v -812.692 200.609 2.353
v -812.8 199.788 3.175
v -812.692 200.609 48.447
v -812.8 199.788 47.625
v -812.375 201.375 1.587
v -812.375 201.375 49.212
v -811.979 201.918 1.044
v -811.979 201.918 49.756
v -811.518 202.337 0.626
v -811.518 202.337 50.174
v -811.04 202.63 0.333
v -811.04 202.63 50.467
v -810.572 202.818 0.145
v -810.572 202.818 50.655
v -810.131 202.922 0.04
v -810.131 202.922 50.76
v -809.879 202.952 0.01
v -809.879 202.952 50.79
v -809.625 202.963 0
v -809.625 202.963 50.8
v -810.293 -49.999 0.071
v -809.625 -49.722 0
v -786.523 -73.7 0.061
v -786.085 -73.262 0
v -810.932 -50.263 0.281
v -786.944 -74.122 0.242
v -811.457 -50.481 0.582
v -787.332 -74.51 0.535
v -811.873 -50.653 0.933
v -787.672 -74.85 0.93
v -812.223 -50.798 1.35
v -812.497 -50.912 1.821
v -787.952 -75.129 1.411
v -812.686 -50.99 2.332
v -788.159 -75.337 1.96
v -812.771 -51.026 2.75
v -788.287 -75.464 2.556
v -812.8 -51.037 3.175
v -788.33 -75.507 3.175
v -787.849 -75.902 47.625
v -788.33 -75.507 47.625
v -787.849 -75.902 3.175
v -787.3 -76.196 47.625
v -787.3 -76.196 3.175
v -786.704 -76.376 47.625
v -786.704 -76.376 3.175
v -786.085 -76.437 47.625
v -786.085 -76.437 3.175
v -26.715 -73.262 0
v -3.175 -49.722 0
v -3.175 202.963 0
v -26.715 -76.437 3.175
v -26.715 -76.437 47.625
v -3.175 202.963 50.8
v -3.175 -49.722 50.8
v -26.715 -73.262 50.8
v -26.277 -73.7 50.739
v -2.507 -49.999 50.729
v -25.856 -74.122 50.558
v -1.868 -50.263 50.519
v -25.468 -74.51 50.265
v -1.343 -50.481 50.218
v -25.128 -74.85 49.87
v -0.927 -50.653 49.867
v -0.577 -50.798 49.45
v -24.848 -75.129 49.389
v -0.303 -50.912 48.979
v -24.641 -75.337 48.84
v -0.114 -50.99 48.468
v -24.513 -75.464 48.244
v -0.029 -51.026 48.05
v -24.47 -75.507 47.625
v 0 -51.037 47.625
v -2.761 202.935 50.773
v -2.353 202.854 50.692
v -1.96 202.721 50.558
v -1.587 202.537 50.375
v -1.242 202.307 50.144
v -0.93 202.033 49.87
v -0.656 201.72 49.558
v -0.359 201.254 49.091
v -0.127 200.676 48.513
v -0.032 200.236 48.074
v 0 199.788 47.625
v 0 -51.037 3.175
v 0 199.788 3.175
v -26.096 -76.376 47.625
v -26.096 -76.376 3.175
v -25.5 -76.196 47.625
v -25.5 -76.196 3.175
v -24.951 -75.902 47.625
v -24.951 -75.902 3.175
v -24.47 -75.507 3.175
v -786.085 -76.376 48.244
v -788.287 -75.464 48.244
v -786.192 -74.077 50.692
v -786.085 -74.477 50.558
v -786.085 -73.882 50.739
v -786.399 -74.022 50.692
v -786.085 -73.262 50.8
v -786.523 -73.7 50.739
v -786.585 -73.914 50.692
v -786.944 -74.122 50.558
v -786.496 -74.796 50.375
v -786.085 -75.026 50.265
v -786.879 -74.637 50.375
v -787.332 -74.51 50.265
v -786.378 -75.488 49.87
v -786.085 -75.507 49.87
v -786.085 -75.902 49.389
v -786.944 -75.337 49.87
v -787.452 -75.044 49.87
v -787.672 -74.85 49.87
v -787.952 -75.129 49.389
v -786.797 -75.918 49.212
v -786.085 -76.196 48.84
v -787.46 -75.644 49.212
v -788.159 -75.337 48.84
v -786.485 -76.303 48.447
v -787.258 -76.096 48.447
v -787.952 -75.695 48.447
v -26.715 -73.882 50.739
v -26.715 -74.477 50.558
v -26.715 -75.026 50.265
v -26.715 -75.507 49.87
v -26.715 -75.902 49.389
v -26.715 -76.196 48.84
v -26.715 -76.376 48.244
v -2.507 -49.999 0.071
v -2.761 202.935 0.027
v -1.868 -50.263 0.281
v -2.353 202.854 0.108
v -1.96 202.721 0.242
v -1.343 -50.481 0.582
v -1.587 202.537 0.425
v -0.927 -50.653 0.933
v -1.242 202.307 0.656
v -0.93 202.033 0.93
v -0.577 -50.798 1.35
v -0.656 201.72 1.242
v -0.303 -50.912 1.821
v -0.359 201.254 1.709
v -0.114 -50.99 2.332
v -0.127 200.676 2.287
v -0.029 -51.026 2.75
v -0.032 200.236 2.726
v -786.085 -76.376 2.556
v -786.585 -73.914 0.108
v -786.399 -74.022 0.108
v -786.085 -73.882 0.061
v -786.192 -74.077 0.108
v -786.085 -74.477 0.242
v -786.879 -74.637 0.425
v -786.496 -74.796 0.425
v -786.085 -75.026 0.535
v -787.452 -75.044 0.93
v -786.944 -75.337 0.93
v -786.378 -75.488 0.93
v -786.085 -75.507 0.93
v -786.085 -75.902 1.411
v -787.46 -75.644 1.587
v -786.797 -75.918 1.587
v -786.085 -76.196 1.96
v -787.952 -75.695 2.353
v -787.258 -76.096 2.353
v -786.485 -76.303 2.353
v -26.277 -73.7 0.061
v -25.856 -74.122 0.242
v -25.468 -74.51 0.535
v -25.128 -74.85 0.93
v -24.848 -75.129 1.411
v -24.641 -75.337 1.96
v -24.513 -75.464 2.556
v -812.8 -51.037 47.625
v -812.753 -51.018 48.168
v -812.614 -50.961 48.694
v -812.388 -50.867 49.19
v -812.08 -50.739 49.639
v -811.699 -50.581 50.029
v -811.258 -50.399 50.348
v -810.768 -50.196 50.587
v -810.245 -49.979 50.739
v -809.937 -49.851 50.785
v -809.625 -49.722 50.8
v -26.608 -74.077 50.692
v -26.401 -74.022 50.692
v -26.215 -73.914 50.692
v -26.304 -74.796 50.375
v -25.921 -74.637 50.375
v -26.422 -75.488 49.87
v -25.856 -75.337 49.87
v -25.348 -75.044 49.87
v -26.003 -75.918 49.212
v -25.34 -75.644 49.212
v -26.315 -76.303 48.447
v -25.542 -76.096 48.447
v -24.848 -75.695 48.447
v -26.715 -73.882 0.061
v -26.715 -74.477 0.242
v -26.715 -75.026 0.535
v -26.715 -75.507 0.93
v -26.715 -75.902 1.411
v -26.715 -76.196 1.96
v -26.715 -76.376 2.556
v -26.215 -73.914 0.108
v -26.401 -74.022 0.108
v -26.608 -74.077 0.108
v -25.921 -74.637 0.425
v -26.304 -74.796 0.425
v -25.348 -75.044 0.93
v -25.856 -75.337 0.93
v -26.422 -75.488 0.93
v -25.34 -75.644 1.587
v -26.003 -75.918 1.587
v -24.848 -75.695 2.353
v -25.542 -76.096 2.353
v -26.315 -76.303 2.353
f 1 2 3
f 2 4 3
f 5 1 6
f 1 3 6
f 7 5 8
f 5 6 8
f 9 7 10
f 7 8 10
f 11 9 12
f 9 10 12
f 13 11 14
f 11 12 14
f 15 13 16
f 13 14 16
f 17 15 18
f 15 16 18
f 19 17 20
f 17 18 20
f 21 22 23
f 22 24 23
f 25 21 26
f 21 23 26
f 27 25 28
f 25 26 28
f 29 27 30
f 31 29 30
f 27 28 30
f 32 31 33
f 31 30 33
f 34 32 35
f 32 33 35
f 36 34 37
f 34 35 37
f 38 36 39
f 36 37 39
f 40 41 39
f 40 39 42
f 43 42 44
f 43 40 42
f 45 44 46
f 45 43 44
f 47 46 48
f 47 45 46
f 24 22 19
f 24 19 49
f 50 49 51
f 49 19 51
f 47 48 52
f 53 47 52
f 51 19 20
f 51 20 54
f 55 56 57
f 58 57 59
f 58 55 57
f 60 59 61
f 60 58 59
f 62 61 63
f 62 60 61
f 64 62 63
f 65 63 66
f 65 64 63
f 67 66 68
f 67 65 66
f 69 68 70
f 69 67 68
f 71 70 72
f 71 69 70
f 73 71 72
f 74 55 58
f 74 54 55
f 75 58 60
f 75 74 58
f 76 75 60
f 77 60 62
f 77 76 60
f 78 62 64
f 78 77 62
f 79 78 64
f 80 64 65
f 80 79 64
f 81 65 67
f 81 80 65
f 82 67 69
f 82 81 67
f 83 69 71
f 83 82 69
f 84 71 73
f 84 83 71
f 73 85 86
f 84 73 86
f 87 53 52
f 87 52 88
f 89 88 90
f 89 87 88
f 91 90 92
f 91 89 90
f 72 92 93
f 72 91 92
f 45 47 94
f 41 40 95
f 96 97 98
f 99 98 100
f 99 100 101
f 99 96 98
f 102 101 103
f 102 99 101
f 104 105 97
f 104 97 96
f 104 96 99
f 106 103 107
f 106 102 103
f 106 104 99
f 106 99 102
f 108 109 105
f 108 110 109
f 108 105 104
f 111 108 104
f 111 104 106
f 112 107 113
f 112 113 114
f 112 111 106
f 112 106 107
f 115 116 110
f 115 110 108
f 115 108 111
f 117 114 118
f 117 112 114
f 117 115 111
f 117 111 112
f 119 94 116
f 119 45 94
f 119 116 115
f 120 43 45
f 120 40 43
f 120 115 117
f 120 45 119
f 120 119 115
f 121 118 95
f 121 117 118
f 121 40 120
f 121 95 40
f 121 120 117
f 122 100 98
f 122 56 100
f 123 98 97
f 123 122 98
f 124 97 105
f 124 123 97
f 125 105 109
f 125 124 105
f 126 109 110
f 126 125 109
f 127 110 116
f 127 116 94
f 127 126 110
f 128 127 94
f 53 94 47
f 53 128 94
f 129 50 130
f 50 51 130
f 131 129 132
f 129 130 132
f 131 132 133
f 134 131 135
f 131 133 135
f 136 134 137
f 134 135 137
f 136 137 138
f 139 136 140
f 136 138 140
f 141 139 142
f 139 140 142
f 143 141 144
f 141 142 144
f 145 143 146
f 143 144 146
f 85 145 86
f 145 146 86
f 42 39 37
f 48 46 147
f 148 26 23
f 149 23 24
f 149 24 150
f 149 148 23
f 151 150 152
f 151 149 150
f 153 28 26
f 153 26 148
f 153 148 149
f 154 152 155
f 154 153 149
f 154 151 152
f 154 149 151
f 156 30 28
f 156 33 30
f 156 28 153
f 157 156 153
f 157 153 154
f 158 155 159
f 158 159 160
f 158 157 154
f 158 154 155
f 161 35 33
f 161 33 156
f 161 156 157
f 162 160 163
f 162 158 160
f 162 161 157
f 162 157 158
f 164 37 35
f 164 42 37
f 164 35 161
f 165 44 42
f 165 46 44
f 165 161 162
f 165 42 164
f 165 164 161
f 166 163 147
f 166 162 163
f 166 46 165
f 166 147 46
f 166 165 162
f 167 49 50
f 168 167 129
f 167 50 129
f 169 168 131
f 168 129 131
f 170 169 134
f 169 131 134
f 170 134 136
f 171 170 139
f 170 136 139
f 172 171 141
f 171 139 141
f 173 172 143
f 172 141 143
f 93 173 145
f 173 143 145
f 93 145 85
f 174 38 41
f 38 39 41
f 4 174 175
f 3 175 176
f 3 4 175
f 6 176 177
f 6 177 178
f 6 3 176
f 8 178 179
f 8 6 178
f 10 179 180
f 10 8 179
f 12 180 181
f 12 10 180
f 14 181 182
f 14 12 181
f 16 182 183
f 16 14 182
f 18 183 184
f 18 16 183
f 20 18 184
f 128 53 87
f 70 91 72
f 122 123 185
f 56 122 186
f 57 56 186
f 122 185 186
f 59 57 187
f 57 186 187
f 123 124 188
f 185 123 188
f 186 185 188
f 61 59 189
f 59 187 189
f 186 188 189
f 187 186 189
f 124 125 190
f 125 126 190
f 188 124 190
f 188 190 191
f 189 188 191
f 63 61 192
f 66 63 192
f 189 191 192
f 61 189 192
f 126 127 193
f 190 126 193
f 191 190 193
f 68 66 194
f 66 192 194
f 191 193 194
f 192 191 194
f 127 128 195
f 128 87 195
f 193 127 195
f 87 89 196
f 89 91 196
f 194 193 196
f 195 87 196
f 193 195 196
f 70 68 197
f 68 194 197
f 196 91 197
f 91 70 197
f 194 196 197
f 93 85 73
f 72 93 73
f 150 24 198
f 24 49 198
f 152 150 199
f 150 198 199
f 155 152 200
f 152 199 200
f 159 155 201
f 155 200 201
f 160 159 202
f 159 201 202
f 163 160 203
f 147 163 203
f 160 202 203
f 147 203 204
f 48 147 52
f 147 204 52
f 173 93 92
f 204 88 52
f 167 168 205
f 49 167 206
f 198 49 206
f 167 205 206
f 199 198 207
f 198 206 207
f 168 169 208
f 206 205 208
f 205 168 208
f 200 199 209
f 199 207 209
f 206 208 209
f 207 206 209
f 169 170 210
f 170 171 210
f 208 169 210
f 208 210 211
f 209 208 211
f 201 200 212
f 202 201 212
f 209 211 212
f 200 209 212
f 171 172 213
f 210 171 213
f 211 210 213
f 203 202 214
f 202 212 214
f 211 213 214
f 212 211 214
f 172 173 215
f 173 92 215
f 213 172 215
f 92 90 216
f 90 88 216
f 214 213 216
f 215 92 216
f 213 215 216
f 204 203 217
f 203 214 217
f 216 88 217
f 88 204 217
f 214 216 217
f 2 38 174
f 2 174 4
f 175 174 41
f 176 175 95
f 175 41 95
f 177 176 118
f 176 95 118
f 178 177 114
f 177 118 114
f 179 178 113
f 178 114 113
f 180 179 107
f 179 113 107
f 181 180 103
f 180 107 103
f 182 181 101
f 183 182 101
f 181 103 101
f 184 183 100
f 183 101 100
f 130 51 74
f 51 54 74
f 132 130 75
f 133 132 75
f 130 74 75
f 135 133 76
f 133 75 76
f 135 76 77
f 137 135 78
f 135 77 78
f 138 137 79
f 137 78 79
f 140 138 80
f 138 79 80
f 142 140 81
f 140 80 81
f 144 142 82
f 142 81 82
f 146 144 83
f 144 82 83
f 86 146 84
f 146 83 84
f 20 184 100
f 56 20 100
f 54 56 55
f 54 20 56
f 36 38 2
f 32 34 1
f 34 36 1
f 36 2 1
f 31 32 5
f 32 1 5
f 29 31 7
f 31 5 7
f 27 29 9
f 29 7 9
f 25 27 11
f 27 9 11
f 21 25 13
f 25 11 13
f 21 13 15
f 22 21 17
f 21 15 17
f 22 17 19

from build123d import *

# Parameters (mm, degrees)
F0_W     = 812.8
F0_H     = 279.4
F1_DEPTH = 50.8
F2_SIZE  = 25.4
F3_R     = 3.175


with BuildPart() as f1:
    # F0 (on Top) → F1 (new body)
    with BuildSketch(Plane.XY):
        with Locations((-406.4, 63.2626240712)):
            Rectangle(F0_W, F0_H)
    extrude(amount=F1_DEPTH)

    # F2
    f2_edges = [f1.edges().sort_by_distance(p)[0] for p in [
        (0, -76.437376, 25.4),
        (-812.8, -76.437376, 25.4),
    ]]
    chamfer(f2_edges, length=F2_SIZE)

    # F3
    f3_edges = [f1.edges().sort_by_distance(p)[0] for p in [
        (-406.4, -76.437376, 0),
        (-787.4, -76.437376, 25.4),
        (-25.4, -76.437376, 25.4),
        (-406.4, -76.437376, 50.8),
        (-800.1, -63.737376, 50.8),
        (-800.1, -63.737376, 0),
        (-12.7, -63.737376, 0),
        (-12.7, -63.737376, 50.8),
        (-812.8, 75.962624, 0),
        (0, 75.962624, 0),
        (0, 75.962624, 50.8),
        (-812.8, 75.962624, 50.8),
        (-812.8, 202.962624, 25.4),
        (0, 202.962624, 25.4),
    ]]
    fillet(f3_edges, radius=F3_R)


solid = f1.part
